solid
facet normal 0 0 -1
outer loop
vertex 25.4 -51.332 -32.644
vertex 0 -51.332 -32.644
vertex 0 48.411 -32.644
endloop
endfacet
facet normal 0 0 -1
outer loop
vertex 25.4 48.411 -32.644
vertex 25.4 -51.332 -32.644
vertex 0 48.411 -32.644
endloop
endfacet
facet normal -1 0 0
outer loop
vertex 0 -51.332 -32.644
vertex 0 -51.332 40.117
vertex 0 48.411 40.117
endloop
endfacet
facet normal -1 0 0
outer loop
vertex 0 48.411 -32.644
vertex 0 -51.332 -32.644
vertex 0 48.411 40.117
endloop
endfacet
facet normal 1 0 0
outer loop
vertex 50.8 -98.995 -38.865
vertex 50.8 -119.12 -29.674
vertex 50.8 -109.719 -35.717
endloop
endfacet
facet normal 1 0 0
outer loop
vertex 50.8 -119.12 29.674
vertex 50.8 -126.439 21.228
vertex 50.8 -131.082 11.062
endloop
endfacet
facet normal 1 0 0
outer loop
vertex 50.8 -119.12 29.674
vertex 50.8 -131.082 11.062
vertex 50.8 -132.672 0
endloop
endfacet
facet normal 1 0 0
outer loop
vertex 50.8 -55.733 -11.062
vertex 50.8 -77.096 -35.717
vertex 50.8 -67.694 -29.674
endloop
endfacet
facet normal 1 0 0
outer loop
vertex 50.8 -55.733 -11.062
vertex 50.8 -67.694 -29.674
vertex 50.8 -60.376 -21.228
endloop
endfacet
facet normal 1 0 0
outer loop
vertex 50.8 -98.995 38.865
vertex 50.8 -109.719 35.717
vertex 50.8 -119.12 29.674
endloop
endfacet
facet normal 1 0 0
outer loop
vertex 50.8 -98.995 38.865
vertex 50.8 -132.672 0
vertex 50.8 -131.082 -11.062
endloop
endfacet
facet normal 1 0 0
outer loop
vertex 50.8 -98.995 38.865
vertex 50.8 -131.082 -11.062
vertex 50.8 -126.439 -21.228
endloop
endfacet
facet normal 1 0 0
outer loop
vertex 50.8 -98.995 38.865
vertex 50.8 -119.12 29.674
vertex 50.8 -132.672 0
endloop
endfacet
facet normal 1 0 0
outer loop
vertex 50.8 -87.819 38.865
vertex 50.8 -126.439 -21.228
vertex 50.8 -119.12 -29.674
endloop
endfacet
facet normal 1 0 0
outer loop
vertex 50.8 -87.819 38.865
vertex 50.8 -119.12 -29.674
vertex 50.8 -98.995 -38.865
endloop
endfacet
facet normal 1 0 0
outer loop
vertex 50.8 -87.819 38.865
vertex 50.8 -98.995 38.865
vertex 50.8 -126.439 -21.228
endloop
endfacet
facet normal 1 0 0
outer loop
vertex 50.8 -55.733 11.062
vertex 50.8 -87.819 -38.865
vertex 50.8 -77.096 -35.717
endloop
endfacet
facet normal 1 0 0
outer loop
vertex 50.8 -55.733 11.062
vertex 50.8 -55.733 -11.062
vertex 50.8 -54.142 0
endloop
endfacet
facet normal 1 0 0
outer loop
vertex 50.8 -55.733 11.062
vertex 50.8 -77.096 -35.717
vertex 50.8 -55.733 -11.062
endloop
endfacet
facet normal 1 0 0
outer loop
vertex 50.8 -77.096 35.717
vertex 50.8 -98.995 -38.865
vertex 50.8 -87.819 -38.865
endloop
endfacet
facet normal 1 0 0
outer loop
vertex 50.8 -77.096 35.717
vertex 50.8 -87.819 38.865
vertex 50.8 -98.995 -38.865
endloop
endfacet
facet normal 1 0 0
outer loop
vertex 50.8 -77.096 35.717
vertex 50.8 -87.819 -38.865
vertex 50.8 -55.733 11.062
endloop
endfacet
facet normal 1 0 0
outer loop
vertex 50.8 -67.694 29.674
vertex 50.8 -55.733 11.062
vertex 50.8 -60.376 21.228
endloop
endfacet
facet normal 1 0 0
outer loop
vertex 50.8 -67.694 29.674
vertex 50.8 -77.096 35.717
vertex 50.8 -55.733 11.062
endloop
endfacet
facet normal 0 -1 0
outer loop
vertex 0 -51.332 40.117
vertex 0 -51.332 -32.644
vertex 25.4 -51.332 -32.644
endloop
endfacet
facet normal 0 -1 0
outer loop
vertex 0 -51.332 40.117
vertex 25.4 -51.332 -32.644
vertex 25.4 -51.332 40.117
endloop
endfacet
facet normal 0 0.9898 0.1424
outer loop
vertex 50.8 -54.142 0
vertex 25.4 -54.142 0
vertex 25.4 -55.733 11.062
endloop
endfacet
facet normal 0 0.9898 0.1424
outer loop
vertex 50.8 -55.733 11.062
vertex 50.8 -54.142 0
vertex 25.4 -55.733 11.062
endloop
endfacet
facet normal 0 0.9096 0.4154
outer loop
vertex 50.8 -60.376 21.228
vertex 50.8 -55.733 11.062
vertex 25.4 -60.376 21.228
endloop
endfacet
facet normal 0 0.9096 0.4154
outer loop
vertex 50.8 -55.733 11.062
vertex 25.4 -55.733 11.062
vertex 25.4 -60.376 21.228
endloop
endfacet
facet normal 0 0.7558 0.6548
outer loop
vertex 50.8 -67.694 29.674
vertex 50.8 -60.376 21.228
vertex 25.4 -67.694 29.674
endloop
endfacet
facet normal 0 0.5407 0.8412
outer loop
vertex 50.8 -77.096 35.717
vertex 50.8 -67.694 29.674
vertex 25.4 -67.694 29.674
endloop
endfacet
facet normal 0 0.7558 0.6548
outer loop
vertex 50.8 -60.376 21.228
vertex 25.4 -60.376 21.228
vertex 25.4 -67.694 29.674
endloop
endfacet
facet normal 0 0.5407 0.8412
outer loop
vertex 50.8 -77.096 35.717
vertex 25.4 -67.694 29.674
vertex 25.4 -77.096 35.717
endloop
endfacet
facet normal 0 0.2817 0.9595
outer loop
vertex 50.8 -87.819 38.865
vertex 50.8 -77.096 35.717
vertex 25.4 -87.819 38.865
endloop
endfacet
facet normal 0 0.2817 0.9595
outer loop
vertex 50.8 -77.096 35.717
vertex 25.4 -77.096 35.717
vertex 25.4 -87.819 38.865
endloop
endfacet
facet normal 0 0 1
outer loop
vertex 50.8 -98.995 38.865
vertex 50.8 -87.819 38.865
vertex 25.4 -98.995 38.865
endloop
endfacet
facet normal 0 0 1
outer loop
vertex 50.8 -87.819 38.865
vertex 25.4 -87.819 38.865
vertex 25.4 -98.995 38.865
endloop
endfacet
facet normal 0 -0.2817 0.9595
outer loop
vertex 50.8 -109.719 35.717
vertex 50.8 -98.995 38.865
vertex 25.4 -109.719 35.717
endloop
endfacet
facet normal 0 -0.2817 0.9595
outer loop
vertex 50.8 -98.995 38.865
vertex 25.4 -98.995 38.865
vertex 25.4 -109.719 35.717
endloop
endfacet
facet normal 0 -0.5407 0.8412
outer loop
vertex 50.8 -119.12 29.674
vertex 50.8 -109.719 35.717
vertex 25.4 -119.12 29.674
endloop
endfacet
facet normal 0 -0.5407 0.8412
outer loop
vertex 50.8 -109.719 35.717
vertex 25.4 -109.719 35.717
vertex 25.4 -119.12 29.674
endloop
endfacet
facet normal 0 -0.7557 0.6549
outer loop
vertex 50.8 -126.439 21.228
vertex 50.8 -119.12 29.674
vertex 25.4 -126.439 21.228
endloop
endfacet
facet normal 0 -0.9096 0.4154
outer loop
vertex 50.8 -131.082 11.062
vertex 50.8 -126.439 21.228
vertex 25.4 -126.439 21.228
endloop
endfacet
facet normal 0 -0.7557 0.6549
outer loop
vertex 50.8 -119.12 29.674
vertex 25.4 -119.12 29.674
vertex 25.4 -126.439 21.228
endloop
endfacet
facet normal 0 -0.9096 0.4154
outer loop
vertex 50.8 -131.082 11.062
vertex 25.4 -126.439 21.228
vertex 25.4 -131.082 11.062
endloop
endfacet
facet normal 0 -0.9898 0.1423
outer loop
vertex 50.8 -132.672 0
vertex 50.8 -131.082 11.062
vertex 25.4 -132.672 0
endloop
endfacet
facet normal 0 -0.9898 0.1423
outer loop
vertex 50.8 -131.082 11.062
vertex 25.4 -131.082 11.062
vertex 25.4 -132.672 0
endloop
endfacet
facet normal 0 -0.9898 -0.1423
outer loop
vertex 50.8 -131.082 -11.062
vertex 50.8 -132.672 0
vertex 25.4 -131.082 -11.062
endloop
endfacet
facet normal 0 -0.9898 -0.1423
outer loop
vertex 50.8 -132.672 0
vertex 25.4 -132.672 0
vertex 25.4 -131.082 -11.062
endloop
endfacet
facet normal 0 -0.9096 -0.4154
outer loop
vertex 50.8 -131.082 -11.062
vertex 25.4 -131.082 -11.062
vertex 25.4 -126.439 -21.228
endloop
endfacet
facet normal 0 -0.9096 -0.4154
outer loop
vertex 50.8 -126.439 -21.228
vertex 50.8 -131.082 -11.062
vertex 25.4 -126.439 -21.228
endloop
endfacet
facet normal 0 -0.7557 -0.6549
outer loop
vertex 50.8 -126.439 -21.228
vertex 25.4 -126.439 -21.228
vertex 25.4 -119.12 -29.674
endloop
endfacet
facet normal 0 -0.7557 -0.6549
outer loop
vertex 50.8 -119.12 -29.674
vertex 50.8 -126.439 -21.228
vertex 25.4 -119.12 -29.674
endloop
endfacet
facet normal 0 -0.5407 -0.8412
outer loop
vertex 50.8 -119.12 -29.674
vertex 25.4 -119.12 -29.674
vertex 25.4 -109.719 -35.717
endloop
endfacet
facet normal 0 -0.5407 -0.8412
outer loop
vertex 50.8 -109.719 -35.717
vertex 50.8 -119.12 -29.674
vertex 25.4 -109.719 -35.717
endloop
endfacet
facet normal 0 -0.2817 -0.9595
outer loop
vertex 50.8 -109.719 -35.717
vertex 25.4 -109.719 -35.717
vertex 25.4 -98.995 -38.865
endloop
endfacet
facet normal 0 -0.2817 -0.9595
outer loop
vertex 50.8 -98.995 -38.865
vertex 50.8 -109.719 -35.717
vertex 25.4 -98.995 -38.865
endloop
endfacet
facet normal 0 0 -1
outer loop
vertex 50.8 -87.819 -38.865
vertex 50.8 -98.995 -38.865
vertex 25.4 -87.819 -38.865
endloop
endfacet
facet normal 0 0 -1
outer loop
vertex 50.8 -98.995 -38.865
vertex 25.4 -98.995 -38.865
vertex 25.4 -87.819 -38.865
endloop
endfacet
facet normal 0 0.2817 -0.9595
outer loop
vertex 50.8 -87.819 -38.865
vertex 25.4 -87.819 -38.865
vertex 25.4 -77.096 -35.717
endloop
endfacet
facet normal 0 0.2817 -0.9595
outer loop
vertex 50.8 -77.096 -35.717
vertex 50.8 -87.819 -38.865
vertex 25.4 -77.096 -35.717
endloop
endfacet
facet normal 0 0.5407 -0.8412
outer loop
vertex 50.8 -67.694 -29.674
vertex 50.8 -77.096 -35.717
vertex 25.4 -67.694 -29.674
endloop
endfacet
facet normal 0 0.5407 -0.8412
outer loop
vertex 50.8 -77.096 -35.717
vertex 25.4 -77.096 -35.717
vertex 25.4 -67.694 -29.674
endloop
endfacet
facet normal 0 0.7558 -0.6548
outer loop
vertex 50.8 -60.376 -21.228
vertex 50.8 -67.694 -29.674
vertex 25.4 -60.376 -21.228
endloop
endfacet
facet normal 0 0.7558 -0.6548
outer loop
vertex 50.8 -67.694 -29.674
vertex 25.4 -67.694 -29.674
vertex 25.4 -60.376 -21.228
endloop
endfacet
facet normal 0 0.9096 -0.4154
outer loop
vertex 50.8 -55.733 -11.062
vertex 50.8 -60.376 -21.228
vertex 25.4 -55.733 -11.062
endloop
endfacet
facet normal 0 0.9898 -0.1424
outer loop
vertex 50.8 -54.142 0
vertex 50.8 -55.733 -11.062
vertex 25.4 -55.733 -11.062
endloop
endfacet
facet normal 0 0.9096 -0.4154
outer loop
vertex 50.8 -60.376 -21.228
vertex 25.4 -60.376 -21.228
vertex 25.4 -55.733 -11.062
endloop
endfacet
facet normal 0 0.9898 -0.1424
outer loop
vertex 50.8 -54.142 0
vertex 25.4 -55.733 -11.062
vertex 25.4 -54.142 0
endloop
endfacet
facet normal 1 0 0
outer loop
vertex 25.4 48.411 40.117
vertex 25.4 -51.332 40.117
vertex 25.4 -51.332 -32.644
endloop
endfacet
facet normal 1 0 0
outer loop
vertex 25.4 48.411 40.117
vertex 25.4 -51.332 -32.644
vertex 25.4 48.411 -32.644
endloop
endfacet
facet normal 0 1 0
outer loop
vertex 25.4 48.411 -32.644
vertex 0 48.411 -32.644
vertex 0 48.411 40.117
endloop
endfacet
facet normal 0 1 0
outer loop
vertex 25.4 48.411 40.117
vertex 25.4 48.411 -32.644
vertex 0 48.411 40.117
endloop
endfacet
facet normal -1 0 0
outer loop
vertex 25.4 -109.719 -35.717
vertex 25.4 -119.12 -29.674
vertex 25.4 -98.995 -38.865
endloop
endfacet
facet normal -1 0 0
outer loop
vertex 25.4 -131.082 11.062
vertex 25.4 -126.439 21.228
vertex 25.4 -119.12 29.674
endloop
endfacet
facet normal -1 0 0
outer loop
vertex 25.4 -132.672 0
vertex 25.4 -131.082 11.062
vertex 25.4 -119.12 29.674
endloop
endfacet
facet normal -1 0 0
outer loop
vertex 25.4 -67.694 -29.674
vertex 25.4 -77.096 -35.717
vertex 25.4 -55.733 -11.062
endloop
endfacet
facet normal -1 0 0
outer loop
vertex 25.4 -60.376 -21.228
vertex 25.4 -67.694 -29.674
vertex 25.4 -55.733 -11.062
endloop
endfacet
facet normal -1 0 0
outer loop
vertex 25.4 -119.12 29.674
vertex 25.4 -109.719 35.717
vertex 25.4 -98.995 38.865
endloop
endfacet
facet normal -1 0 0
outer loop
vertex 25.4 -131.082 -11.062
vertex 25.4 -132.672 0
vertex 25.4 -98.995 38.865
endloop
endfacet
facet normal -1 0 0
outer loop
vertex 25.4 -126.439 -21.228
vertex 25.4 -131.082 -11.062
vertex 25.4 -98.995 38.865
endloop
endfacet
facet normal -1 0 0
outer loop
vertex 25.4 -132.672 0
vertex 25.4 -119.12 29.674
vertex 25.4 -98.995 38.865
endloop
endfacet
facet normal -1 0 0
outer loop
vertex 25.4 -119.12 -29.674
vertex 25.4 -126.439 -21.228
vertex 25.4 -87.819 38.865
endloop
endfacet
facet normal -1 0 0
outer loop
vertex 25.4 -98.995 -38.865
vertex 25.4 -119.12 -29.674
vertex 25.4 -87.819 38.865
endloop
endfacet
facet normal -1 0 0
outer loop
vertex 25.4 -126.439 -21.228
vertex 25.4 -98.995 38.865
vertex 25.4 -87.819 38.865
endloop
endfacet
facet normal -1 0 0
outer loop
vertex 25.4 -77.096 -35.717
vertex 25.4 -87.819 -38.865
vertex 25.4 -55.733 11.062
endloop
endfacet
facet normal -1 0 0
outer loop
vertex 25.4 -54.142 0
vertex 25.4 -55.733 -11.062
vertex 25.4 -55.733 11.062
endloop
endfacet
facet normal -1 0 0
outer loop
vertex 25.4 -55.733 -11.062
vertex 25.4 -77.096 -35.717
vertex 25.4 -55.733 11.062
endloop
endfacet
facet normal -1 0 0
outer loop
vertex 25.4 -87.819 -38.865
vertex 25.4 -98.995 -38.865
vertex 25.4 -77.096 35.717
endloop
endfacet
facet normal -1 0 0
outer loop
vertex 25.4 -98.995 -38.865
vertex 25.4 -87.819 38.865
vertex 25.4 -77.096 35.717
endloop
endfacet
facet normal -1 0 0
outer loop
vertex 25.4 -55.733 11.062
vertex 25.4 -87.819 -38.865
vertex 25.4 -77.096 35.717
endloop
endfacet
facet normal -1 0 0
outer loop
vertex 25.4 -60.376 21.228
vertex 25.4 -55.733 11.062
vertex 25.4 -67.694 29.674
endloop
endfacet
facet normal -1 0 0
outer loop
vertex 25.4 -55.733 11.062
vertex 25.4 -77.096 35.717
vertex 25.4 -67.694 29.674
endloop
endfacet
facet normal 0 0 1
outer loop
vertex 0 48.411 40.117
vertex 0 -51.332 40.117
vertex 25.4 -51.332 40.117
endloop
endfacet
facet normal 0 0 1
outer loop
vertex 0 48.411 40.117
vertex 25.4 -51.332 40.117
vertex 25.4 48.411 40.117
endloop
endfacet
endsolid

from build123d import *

# Parameters (mm, degrees)
F0_W     = 99.7435823083
F0_H     = 72.7609619498
F0_R     = 32.510213414
F1_DEPTH = 25.4
F2_R     = 39.2648783407
F3_DEPTH = 25.4


with BuildPart() as f1:
    # F0 (on Right) → F1 (new body)
    with BuildSketch(Plane.YZ):
        with Locations((-1.4606527984, 3.7365816534)):
            Rectangle(F0_W, F0_H)
        Circle(F0_R, mode=Mode.SUBTRACT)
        Circle(F0_R)
    extrude(amount=F1_DEPTH)


with BuildPart() as f3:
    # F2 (on face) → F3 (new body)
    with BuildSketch(Plane.YZ.offset(25.4)):
        with Locations((-93.4072956443, 0)):
            Circle(F2_R)
    extrude(amount=F3_DEPTH)


solid = Compound([f1.part, f3.part])
